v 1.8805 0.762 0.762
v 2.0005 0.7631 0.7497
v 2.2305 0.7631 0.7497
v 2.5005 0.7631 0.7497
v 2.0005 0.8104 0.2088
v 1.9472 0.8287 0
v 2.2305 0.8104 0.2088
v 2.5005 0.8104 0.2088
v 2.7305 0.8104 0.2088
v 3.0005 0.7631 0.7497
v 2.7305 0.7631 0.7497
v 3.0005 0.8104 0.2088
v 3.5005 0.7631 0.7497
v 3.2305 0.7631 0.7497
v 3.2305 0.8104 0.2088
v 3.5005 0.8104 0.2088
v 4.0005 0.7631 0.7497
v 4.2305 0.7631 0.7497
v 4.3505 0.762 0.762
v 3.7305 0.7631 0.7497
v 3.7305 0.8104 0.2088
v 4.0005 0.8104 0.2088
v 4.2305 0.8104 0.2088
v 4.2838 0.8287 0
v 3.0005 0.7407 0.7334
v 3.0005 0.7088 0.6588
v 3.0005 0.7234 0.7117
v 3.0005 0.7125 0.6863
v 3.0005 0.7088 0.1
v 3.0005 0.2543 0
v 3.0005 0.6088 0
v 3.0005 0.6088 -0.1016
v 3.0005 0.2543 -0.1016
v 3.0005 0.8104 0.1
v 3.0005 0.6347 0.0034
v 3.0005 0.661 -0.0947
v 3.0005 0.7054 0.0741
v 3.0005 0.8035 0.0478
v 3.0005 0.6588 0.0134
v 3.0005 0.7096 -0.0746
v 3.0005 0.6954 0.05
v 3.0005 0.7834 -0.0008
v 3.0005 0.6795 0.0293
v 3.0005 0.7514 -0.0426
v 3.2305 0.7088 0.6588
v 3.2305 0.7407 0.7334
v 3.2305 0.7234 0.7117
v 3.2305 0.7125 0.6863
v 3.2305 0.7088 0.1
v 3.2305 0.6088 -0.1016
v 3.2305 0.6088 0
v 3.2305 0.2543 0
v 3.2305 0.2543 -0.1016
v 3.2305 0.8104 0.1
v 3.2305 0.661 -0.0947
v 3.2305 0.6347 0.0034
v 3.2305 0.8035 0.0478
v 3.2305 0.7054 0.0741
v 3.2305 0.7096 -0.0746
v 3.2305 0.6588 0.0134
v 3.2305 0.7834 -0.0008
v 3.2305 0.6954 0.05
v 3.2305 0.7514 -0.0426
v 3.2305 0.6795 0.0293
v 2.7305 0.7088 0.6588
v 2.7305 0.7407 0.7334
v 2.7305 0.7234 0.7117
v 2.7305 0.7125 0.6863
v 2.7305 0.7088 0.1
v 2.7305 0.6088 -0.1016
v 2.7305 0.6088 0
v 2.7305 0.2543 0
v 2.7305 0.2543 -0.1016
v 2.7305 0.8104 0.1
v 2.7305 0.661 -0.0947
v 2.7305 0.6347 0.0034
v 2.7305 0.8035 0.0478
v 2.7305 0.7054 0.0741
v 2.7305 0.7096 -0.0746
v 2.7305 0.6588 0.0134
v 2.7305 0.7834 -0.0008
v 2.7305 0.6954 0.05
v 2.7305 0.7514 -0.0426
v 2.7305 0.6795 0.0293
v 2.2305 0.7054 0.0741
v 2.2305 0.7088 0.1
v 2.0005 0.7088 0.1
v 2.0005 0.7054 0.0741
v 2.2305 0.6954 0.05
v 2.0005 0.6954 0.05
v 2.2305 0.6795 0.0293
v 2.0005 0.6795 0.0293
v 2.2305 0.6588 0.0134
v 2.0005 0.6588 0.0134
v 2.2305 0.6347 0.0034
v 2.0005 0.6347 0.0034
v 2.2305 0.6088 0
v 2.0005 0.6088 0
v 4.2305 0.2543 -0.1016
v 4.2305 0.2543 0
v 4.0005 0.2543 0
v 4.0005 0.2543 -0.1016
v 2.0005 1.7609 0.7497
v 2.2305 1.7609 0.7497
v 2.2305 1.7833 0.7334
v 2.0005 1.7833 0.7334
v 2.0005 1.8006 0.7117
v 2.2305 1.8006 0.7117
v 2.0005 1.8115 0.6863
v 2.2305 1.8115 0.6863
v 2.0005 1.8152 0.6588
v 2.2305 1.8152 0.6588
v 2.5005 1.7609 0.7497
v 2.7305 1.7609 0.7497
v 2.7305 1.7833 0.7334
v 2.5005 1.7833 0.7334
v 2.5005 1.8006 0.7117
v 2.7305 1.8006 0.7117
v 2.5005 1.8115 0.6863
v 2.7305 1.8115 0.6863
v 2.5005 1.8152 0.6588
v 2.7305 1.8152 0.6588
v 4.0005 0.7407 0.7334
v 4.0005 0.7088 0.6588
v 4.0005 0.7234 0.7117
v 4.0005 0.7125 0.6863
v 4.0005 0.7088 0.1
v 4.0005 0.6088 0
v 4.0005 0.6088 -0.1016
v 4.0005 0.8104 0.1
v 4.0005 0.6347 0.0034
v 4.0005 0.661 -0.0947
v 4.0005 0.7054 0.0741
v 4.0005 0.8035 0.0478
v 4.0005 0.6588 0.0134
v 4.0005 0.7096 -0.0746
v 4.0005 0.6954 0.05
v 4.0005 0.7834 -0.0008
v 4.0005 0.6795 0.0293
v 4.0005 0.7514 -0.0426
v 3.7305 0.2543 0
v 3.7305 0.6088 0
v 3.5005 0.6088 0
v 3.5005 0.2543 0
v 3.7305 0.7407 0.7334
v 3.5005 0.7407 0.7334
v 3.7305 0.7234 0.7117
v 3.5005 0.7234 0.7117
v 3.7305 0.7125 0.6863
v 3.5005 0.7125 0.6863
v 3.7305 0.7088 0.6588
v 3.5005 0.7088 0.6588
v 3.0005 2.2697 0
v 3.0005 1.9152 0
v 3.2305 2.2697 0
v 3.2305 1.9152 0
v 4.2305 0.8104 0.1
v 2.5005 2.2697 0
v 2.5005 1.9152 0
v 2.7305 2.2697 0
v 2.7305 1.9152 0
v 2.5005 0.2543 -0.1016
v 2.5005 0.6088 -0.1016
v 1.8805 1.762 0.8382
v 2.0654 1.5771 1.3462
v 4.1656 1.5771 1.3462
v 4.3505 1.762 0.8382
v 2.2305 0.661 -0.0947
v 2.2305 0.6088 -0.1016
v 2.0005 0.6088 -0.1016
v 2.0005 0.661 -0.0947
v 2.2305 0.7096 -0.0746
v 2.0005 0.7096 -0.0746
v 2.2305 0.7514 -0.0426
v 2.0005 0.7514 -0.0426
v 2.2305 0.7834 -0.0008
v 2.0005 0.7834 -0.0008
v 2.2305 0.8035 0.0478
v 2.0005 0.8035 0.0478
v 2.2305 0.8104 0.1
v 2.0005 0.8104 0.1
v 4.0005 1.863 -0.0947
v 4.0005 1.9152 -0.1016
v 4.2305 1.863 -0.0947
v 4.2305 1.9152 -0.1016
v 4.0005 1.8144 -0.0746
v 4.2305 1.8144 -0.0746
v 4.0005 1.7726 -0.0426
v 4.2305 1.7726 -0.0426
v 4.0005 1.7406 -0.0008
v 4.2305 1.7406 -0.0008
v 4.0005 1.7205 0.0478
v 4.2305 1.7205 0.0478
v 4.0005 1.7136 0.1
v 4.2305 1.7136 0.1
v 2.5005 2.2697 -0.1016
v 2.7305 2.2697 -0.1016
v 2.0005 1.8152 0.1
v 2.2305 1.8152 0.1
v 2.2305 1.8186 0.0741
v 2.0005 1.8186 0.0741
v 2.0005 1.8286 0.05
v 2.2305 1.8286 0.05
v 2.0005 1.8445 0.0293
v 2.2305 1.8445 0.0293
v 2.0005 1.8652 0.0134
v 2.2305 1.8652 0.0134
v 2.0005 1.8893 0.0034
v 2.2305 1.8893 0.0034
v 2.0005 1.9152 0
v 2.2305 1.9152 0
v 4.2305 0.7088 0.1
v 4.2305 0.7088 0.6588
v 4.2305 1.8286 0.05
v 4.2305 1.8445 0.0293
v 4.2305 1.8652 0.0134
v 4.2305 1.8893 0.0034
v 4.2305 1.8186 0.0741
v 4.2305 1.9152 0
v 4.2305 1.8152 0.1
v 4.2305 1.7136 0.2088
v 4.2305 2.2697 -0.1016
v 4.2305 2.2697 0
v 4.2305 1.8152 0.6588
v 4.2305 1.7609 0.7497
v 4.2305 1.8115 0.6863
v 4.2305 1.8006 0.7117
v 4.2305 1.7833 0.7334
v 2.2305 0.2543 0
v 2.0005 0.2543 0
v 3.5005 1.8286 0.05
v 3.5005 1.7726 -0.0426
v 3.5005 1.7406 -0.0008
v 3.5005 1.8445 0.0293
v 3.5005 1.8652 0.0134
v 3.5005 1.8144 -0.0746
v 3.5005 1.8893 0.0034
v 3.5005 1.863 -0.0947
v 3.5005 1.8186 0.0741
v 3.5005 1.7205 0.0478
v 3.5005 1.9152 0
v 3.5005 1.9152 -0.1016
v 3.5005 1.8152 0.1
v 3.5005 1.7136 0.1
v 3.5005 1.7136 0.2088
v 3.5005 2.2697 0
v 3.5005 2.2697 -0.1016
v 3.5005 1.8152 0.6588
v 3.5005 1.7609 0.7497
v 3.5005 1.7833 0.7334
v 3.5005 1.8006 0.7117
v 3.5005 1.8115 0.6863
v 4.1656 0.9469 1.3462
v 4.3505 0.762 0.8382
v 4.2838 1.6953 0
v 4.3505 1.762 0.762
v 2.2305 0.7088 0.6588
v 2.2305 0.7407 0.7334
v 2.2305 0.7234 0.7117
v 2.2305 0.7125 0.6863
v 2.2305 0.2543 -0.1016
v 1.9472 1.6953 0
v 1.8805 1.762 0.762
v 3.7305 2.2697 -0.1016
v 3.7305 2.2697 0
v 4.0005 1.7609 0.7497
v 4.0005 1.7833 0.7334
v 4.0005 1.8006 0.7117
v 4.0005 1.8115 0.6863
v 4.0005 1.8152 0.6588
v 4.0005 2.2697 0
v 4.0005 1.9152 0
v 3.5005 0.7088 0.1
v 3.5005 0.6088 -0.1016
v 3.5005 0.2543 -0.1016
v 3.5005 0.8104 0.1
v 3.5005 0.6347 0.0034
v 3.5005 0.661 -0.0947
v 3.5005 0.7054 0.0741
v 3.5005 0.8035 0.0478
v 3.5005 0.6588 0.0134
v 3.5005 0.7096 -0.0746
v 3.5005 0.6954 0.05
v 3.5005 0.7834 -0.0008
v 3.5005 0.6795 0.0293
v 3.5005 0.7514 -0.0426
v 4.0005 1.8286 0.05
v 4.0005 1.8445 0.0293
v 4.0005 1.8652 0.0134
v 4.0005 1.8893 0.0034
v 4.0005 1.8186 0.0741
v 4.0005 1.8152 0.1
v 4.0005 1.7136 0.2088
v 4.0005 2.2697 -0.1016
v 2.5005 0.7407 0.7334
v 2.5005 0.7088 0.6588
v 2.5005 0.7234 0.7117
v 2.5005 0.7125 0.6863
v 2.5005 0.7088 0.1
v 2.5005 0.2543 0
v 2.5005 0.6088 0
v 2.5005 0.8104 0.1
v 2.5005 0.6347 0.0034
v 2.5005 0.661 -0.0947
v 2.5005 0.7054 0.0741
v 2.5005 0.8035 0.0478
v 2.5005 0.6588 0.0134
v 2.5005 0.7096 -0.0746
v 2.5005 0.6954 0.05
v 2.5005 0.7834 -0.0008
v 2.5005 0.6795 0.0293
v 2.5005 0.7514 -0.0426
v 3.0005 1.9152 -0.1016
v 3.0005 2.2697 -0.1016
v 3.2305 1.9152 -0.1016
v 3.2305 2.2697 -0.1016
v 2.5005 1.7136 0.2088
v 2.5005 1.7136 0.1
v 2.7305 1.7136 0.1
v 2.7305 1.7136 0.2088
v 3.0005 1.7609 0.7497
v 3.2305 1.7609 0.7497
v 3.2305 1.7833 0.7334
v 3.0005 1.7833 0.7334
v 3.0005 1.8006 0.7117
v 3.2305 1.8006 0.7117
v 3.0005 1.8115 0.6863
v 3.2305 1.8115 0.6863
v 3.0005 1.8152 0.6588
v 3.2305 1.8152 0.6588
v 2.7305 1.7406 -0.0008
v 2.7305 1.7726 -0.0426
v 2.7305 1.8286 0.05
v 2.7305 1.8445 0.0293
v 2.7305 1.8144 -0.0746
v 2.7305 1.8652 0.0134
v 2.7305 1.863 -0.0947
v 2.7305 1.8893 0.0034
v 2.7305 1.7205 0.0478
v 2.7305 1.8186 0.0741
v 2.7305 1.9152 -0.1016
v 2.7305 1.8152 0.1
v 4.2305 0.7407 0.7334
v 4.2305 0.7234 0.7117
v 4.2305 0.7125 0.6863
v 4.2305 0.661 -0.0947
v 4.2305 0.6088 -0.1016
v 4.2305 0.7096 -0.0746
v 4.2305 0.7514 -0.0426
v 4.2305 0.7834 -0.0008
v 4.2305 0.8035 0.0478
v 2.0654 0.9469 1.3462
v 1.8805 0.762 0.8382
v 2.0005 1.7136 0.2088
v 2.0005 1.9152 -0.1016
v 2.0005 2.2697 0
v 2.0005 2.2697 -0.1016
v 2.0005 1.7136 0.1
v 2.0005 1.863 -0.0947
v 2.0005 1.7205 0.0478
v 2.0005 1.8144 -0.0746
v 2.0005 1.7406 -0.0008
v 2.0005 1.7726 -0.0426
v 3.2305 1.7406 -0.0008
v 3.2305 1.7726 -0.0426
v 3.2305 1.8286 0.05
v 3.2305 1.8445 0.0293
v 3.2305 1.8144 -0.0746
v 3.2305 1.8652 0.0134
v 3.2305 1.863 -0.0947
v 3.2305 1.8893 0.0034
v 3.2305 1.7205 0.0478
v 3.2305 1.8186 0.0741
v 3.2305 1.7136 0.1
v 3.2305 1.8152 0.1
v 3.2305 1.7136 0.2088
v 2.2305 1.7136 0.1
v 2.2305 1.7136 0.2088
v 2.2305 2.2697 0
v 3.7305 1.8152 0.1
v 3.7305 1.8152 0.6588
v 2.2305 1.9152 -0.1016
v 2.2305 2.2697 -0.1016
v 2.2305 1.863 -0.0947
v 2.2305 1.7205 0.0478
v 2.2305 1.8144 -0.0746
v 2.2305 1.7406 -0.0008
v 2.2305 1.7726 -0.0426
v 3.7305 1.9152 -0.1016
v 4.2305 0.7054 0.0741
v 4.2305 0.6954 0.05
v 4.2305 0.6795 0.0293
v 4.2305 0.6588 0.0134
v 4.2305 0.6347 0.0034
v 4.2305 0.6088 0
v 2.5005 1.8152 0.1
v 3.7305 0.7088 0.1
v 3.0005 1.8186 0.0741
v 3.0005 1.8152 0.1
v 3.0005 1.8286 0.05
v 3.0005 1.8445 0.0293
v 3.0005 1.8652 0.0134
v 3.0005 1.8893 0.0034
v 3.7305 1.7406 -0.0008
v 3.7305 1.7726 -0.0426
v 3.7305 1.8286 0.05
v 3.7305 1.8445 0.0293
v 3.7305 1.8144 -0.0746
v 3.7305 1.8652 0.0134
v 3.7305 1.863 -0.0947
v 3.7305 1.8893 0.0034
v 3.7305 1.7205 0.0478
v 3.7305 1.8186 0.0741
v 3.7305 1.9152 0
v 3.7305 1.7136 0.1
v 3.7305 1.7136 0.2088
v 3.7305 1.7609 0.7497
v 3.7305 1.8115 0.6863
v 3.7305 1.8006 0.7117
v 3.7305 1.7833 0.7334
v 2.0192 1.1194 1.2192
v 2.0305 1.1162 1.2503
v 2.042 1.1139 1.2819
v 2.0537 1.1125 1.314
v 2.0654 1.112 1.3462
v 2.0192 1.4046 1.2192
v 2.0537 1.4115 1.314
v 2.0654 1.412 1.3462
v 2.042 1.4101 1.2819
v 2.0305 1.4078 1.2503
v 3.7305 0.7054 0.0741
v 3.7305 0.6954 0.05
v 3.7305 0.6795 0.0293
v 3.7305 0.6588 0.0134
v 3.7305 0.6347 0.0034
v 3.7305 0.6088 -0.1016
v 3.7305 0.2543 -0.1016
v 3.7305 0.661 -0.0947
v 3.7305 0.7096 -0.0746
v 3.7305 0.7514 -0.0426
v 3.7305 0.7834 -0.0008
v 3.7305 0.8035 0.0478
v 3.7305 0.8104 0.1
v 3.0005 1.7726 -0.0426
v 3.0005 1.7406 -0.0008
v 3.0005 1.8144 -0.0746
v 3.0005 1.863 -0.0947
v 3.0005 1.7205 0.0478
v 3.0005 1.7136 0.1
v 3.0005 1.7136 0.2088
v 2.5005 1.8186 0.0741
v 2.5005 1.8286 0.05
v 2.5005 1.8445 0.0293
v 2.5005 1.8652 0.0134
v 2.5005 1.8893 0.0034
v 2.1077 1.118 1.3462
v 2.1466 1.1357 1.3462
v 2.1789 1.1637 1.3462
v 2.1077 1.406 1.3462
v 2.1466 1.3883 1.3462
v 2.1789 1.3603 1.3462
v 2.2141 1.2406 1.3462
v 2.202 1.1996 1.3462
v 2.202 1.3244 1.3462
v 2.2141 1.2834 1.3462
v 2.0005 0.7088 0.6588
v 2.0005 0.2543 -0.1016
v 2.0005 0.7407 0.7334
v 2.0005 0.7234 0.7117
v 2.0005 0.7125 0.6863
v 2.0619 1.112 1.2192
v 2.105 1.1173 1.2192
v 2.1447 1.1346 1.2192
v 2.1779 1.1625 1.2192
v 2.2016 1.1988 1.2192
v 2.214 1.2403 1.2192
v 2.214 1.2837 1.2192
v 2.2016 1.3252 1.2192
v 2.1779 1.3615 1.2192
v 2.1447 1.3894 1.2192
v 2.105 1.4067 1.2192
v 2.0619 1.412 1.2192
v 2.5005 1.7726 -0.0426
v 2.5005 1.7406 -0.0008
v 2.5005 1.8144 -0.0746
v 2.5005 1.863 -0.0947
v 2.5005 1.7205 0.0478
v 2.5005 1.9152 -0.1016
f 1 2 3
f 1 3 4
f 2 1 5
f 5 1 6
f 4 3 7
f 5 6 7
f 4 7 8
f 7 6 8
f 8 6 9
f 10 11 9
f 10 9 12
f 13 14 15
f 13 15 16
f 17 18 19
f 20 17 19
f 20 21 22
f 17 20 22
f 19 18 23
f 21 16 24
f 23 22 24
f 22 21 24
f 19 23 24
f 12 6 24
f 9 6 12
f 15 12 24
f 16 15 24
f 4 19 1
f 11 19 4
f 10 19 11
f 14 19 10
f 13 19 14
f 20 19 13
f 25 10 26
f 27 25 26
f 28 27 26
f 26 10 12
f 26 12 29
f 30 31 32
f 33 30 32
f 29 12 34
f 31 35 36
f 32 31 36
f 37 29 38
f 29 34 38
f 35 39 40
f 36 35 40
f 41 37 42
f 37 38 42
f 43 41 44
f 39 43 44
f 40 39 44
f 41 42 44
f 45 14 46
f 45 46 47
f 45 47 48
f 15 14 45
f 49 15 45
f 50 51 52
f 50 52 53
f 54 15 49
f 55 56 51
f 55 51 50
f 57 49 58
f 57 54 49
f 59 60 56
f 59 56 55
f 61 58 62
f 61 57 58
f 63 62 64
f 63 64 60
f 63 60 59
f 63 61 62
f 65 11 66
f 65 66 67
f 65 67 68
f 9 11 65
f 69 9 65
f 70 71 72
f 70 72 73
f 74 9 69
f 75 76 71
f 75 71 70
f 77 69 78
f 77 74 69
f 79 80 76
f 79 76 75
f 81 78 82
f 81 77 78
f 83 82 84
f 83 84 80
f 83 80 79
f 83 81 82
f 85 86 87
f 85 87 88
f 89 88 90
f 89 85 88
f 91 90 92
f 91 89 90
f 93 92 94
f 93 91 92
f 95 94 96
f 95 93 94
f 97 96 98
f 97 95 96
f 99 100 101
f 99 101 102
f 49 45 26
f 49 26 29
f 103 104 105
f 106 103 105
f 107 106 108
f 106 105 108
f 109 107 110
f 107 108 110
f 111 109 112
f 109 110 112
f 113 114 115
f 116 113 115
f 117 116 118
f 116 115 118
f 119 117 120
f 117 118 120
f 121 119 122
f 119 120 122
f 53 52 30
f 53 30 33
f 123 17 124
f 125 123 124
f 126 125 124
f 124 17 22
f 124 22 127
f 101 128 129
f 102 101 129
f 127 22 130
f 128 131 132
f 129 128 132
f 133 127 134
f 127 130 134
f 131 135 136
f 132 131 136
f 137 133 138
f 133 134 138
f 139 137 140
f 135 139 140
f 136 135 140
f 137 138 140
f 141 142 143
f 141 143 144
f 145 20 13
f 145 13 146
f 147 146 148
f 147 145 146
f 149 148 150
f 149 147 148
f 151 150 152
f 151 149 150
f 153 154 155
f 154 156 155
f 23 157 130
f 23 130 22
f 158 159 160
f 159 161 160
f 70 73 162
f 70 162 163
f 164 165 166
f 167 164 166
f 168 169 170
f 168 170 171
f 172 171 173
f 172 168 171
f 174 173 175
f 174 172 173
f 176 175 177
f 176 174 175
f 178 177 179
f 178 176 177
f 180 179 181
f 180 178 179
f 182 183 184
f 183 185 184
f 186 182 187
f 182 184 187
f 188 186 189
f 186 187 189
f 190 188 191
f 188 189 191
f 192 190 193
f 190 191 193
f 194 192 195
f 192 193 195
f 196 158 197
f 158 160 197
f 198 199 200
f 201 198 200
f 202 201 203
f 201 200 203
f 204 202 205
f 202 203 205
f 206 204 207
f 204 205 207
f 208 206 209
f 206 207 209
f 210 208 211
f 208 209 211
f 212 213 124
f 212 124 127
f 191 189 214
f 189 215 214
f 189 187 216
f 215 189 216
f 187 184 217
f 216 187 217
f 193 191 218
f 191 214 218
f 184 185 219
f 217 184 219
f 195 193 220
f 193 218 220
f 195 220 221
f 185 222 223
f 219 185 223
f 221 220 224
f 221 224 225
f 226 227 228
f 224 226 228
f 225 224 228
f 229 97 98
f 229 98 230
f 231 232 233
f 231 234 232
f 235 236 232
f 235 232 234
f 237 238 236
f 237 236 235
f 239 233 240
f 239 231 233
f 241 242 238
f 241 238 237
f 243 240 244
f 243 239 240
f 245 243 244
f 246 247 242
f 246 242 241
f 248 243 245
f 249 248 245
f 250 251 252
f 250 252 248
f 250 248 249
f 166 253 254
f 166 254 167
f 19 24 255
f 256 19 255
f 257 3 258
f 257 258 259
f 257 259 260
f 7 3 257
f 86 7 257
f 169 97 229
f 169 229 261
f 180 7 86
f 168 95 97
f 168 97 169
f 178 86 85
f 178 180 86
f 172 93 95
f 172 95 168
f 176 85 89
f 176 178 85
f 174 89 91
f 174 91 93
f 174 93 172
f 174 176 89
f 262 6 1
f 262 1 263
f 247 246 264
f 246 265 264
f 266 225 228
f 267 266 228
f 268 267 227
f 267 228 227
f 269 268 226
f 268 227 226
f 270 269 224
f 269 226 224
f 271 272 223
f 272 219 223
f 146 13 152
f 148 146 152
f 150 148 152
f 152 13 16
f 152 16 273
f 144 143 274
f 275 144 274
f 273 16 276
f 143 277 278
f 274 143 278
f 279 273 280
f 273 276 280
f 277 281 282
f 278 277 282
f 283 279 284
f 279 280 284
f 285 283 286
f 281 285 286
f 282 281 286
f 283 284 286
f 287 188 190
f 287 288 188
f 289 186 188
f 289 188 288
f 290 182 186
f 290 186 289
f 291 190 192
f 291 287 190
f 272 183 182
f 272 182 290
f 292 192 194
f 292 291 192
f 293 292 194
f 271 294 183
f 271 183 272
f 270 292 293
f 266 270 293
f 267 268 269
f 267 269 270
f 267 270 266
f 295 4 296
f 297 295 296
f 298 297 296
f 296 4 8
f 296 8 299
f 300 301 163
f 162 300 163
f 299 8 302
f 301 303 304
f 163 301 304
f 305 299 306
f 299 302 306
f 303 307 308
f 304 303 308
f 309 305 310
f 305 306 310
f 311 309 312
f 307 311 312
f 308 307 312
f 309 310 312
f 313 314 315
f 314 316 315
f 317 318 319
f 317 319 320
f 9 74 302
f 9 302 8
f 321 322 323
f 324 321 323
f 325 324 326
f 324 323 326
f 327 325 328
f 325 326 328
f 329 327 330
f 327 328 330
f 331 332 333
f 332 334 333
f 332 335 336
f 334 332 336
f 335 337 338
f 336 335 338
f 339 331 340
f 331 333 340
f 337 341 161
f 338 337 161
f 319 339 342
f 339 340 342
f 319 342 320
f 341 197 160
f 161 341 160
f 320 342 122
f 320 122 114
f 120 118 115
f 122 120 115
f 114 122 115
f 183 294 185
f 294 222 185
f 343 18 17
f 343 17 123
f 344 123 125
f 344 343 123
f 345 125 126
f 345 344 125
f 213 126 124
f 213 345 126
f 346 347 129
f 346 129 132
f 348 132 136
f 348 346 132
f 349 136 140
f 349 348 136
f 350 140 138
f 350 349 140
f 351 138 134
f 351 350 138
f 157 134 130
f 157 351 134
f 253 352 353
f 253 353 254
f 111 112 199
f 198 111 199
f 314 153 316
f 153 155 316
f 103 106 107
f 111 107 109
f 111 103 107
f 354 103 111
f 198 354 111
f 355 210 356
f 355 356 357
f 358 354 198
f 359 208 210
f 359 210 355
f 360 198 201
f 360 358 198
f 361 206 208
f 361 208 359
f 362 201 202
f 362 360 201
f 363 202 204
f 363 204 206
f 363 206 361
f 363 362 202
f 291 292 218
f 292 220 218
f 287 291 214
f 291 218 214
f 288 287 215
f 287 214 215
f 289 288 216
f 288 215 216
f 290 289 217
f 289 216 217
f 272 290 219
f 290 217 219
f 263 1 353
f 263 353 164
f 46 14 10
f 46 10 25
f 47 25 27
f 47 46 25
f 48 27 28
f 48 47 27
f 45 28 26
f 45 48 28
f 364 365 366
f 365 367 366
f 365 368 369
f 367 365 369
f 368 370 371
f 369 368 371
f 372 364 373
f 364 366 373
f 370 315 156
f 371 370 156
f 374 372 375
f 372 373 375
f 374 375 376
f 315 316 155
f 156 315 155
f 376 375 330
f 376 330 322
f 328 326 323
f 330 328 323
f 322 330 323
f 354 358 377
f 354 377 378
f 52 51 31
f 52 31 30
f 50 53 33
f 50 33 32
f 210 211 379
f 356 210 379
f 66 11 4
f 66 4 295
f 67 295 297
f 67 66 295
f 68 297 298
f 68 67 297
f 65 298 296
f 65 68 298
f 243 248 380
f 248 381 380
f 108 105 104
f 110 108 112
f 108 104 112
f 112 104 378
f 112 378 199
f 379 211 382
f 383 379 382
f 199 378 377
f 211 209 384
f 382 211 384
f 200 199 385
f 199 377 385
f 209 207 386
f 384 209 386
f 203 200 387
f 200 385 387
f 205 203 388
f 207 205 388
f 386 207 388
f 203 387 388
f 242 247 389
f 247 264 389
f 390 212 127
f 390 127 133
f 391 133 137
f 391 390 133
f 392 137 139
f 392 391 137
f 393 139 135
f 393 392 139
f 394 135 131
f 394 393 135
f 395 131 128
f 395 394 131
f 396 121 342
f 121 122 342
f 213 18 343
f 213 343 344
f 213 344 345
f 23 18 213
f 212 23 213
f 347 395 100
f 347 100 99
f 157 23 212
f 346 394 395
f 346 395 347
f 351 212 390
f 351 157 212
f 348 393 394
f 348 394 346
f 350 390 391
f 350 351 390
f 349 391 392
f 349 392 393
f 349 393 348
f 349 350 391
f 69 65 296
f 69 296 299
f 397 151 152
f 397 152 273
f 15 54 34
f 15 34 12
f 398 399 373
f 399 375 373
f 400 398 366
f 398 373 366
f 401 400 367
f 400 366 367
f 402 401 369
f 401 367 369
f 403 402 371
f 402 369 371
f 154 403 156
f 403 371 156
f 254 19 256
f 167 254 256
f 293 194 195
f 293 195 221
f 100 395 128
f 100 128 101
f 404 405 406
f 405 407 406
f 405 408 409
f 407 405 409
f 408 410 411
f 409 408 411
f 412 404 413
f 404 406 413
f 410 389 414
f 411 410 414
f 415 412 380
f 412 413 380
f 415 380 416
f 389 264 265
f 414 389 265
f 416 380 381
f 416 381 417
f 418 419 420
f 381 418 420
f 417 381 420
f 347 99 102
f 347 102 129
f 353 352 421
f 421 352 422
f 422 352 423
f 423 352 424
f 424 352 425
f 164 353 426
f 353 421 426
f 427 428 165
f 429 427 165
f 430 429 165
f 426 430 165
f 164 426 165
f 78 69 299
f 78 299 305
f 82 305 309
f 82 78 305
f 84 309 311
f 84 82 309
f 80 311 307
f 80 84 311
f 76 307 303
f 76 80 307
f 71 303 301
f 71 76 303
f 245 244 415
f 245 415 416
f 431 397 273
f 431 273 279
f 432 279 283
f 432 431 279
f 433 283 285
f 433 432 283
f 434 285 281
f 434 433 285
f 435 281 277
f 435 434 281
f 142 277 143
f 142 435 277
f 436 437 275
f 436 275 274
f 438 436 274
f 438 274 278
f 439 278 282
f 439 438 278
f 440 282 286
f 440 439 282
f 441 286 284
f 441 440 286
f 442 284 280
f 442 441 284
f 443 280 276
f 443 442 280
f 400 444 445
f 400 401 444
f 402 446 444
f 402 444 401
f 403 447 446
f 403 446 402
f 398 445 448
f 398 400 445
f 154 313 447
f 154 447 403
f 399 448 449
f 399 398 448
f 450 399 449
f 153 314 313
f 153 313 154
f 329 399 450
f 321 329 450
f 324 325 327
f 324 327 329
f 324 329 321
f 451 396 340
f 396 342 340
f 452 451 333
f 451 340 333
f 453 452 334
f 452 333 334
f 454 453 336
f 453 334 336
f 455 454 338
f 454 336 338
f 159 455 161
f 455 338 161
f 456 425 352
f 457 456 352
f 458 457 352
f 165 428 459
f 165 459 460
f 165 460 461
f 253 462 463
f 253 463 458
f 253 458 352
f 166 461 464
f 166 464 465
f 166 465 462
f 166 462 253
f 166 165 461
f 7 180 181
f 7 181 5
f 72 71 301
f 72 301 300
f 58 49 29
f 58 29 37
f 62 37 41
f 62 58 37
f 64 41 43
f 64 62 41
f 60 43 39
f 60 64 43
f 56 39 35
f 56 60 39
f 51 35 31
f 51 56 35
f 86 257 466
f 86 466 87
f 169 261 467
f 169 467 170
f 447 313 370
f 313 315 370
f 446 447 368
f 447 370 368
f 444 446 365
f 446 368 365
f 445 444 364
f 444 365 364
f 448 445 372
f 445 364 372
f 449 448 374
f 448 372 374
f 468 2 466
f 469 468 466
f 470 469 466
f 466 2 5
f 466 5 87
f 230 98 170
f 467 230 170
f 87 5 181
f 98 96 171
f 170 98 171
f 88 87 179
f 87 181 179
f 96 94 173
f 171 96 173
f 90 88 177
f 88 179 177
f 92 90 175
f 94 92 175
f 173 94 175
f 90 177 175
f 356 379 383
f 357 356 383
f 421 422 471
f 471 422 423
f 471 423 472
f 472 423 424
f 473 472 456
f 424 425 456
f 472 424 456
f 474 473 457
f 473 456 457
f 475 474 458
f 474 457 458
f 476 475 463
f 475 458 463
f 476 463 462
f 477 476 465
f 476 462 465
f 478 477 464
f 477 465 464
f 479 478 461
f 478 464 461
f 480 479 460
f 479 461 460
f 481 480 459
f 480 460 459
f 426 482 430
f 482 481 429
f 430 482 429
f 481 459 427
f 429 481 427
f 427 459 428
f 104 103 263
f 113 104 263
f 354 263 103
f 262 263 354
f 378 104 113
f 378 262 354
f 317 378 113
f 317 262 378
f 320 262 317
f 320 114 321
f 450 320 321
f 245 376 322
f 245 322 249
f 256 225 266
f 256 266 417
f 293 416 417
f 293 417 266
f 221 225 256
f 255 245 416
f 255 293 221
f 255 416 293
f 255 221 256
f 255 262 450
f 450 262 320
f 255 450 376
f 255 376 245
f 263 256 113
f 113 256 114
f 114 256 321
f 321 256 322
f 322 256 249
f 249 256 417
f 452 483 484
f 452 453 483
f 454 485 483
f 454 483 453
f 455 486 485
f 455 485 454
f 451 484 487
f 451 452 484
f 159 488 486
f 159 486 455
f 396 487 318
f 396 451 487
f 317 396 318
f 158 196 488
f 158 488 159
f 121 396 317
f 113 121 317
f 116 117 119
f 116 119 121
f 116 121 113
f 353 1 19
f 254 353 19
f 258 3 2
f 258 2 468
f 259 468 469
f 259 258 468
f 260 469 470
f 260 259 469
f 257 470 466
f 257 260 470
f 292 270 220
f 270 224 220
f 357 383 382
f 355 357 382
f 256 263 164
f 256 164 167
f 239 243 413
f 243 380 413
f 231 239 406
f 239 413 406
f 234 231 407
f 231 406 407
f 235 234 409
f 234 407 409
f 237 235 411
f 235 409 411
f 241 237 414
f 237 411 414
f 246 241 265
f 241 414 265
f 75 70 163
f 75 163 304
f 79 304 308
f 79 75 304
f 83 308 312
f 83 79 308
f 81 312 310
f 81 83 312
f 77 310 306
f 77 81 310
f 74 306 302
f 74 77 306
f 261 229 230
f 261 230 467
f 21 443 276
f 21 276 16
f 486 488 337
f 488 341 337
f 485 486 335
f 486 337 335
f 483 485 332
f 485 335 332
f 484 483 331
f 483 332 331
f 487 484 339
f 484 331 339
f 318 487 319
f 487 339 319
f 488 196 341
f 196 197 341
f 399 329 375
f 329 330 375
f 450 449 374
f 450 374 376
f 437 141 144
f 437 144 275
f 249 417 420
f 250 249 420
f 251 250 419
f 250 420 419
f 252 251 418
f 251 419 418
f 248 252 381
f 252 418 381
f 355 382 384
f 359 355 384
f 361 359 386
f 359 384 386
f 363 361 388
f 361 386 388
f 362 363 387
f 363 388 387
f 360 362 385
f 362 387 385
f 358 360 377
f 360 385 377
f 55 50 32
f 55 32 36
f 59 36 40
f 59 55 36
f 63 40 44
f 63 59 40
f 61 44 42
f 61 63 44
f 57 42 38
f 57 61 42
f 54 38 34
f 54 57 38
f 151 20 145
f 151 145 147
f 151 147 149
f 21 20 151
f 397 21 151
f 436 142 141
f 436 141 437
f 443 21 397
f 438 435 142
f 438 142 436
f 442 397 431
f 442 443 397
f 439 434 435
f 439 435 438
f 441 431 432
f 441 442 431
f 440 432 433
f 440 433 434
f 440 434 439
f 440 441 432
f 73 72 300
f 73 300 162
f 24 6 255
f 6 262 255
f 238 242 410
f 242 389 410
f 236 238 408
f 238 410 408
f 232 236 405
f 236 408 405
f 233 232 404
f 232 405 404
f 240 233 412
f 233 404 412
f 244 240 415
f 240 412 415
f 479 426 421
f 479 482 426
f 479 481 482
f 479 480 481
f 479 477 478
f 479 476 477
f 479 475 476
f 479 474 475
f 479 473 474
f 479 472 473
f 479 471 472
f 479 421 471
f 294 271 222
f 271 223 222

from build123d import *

# Parameters (mm, degrees)
SKETCH1_W                = 2.47
SKETCH1_H                = 1
BASE_EXTRUDE_DEPTH       = 1.3462
CHAMFER1_SIZE            = 0.508
CHAMFER1_SIZE2           = 0.184896879
CHAMFER1_PART_2_SIZE     = 0.508
CHAMFER1_PART_2_SIZE2    = 0.184896879
CHAMFER1_PART_3_SIZE     = 0.508
CHAMFER1_PART_3_SIZE2    = 0.184896879
CHAMFER1_PART_4_SIZE     = 0.508
CHAMFER1_PART_4_SIZE2    = 0.184896879
CHAMFER2_SIZE            = 0.762
CHAMFER2_SIZE2           = 0.066666362
CHAMFER2_PART_2_SIZE     = 0.762
CHAMFER2_PART_2_SIZE2    = 0.066666362
CHAMFER2_PART_3_SIZE     = 0.762
CHAMFER2_PART_3_SIZE2    = 0.066666362
CHAMFER2_PART_4_SIZE     = 0.762
CHAMFER2_PART_4_SIZE2    = 0.066666362
SKETCH3_R                = 0.15
CUT_EXTRUDE1_DEPTH       = 0.127
BOSS_EXTRUDE_THIN3_DEPTH = 0.115
LPATTERN1_COUNT          = 5
LPATTERN1_PITCH          = 0.5
MIRROR1_COPY_1_DEPTH     = 0.115
MIRROR1_COPY_2_DEPTH     = 0.115
MIRROR1_COPY_3_DEPTH     = 0.115
MIRROR1_COPY_4_DEPTH     = 0.115


with BuildPart() as part:
    # Sketch1 → Base-Extrude (new body)
    with BuildSketch(Plane.XY):
        with Locations((3.115498433, 1.262)):
            Rectangle(SKETCH1_W, SKETCH1_H)
    extrude(amount=BASE_EXTRUDE_DEPTH)

    # Chamfer1
    chamfer1_edges = [part.edges().sort_by_distance(p)[0] for p in [
        (4.350498433, 1.262, 1.3462),
    ]]
    chamfer1_side = [part.faces().sort_by_distance(p)[0] for p in [
        (4.350498433, 1.262, 0.6731),
    ]]
    chamfer(chamfer1_edges, length=CHAMFER1_SIZE, length2=CHAMFER1_SIZE2, reference=chamfer1_side[0])

    # Chamfer1 part 2
    chamfer1_part_2_edges = [part.edges().sort_by_distance(p)[0] for p in [
        (3.115498433, 1.762, 1.3462),
    ]]
    chamfer1_part_2_side = [part.faces().sort_by_distance(p)[0] for p in [
        (3.115498433, 1.762, 0.6731),
    ]]
    chamfer(chamfer1_part_2_edges, length=CHAMFER1_PART_2_SIZE, length2=CHAMFER1_PART_2_SIZE2, reference=chamfer1_part_2_side[0])

    # Chamfer1 part 3
    chamfer1_part_3_edges = [part.edges().sort_by_distance(p)[0] for p in [
        (1.880498433, 1.262, 1.3462),
    ]]
    chamfer1_part_3_side = [part.faces().sort_by_distance(p)[0] for p in [
        (1.880498433, 1.262, 0.6731),
    ]]
    chamfer(chamfer1_part_3_edges, length=CHAMFER1_PART_3_SIZE, length2=CHAMFER1_PART_3_SIZE2, reference=chamfer1_part_3_side[0])

    # Chamfer1 part 4
    chamfer1_part_4_edges = [part.edges().sort_by_distance(p)[0] for p in [
        (3.115498433, 0.762, 1.3462),
    ]]
    chamfer1_part_4_side = [part.faces().sort_by_distance(p)[0] for p in [
        (3.115498433, 0.762, 0.6731),
    ]]
    chamfer(chamfer1_part_4_edges, length=CHAMFER1_PART_4_SIZE, length2=CHAMFER1_PART_4_SIZE2, reference=chamfer1_part_4_side[0])

    # Chamfer2
    chamfer2_edges = [part.edges().sort_by_distance(p)[0] for p in [
        (3.115498433, 1.762, 0),
    ]]
    chamfer2_side = [part.faces().sort_by_distance(p)[0] for p in [
        (3.115498433, 1.762, 0.4191),
    ]]
    chamfer(chamfer2_edges, length=CHAMFER2_SIZE, length2=CHAMFER2_SIZE2, reference=chamfer2_side[0])

    # Chamfer2 part 2
    chamfer2_part_2_edges = [part.edges().sort_by_distance(p)[0] for p in [
        (4.350498433, 1.262, 0),
    ]]
    chamfer2_part_2_side = [part.faces().sort_by_distance(p)[0] for p in [
        (4.350498433, 1.262, 0.4191),
    ]]
    chamfer(chamfer2_part_2_edges, length=CHAMFER2_PART_2_SIZE, length2=CHAMFER2_PART_2_SIZE2, reference=chamfer2_part_2_side[0])

    # Chamfer2 part 3
    chamfer2_part_3_edges = [part.edges().sort_by_distance(p)[0] for p in [
        (3.115498433, 0.762, 0),
    ]]
    chamfer2_part_3_side = [part.faces().sort_by_distance(p)[0] for p in [
        (3.115498433, 0.762, 0.4191),
    ]]
    chamfer(chamfer2_part_3_edges, length=CHAMFER2_PART_3_SIZE, length2=CHAMFER2_PART_3_SIZE2, reference=chamfer2_part_3_side[0])

    # Chamfer2 part 4
    chamfer2_part_4_edges = [part.edges().sort_by_distance(p)[0] for p in [
        (1.880498433, 1.262, 0),
    ]]
    chamfer2_part_4_side = [part.faces().sort_by_distance(p)[0] for p in [
        (1.880498433, 1.262, 0.4191),
    ]]
    chamfer(chamfer2_part_4_edges, length=CHAMFER2_PART_4_SIZE, length2=CHAMFER2_PART_4_SIZE2, reference=chamfer2_part_4_side[0])

    # Sketch3 → Cut-Extrude1 (cut)
    with BuildSketch(Plane(origin=(0.118935742, 0.142956615, 1.3462), x_dir=(1, 0, 0), z_dir=(0, 0, 1))):
        with Locations((1.946665812, 1.119043385)):
            Circle(SKETCH3_R)
    extrude(amount=-CUT_EXTRUDE1_DEPTH, mode=Mode.SUBTRACT)

    # Sketch4 → Boss-Extrude-Thin3 (add, symmetric)
    with BuildSketch(Plane(origin=(2.115498433, 0, 0), x_dir=(0, 0, -1), z_dir=(1, 0, 0))):
        with BuildLine():
            ThreePointArc((-0.762, 0.812000071), (-0.73177342, 0.739026651), (-0.6588, 0.708800071))
            Line((-0.6588, 0.708800071), (-0.1, 0.708800071))
            ThreePointArc((-0.1, 0.708800071), (-0.029289322, 0.679510749), (0, 0.608800071))
            Line((0, 0.608800071), (0, 0.254259822))
            Line((0, 0.254259822), (0.1016, 0.254259822))
            Line((0.1016, 0.254259822), (0.1016, 0.608800071))
            ThreePointArc((0.1016, 0.608800071), (0.042552727, 0.751352798), (-0.1, 0.810400071))
            Line((-0.1, 0.810400071), (-0.6588, 0.810400071))
            ThreePointArc((-0.6588, 0.810400071), (-0.659931371, 0.8108687), (-0.6604, 0.812000071))
            Line((-0.6604, 0.812000071), (-0.762, 0.812000071))
        make_face()
    boss_extrude_thin3 = extrude(amount=BOSS_EXTRUDE_THIN3_DEPTH, both=True)

    # LPattern1: Boss-Extrude-Thin3 ×5
    with Locations(*[(i * LPATTERN1_PITCH, 0, 0) for i in range(1, LPATTERN1_COUNT)]):
        add(boss_extrude_thin3)

    # Mirror1: Boss-Extrude-Thin3 across plane
    add(boss_extrude_thin3.mirror(Plane.ZX.offset(1.262)))

    # Mirror1 copy 1 sketch → Mirror1 copy 1 (add, symmetric)
    with BuildSketch(Plane(origin=(2.615498433, 2.524, 0), x_dir=(0, 0, -1), z_dir=(1, 0, 0))):
        with BuildLine():
            ThreePointArc((-0.762, -0.812000071), (-0.73177342, -0.739026651), (-0.6588, -0.708800071))
            Line((-0.6588, -0.708800071), (-0.1, -0.708800071))
            ThreePointArc((-0.1, -0.708800071), (-0.029289322, -0.679510749), (0, -0.608800071))
            Line((0, -0.608800071), (0, -0.254259822))
            Line((0, -0.254259822), (0.1016, -0.254259822))
            Line((0.1016, -0.254259822), (0.1016, -0.608800071))
            ThreePointArc((0.1016, -0.608800071), (0.042552727, -0.751352798), (-0.1, -0.810400071))
            Line((-0.1, -0.810400071), (-0.6588, -0.810400071))
            ThreePointArc((-0.6588, -0.810400071), (-0.659931371, -0.8108687), (-0.6604, -0.812000071))
            Line((-0.6604, -0.812000071), (-0.762, -0.812000071))
        make_face()
    extrude(amount=MIRROR1_COPY_1_DEPTH, both=True)

    # Mirror1 copy 2 sketch → Mirror1 copy 2 (add, symmetric)
    with BuildSketch(Plane(origin=(3.115498433, 2.524, 0), x_dir=(0, 0, -1), z_dir=(1, 0, 0))):
        with BuildLine():
            ThreePointArc((-0.762, -0.812000071), (-0.73177342, -0.739026651), (-0.6588, -0.708800071))
            Line((-0.6588, -0.708800071), (-0.1, -0.708800071))
            ThreePointArc((-0.1, -0.708800071), (-0.029289322, -0.679510749), (0, -0.608800071))
            Line((0, -0.608800071), (0, -0.254259822))
            Line((0, -0.254259822), (0.1016, -0.254259822))
            Line((0.1016, -0.254259822), (0.1016, -0.608800071))
            ThreePointArc((0.1016, -0.608800071), (0.042552727, -0.751352798), (-0.1, -0.810400071))
            Line((-0.1, -0.810400071), (-0.6588, -0.810400071))
            ThreePointArc((-0.6588, -0.810400071), (-0.659931371, -0.8108687), (-0.6604, -0.812000071))
            Line((-0.6604, -0.812000071), (-0.762, -0.812000071))
        make_face()
    extrude(amount=MIRROR1_COPY_2_DEPTH, both=True)

    # Mirror1 copy 3 sketch → Mirror1 copy 3 (add, symmetric)
    with BuildSketch(Plane(origin=(3.615498433, 2.524, 0), x_dir=(0, 0, -1), z_dir=(1, 0, 0))):
        with BuildLine():
            ThreePointArc((-0.762, -0.812000071), (-0.73177342, -0.739026651), (-0.6588, -0.708800071))
            Line((-0.6588, -0.708800071), (-0.1, -0.708800071))
            ThreePointArc((-0.1, -0.708800071), (-0.029289322, -0.679510749), (0, -0.608800071))
            Line((0, -0.608800071), (0, -0.254259822))
            Line((0, -0.254259822), (0.1016, -0.254259822))
            Line((0.1016, -0.254259822), (0.1016, -0.608800071))
            ThreePointArc((0.1016, -0.608800071), (0.042552727, -0.751352798), (-0.1, -0.810400071))
            Line((-0.1, -0.810400071), (-0.6588, -0.810400071))
            ThreePointArc((-0.6588, -0.810400071), (-0.659931371, -0.8108687), (-0.6604, -0.812000071))
            Line((-0.6604, -0.812000071), (-0.762, -0.812000071))
        make_face()
    extrude(amount=MIRROR1_COPY_3_DEPTH, both=True)

    # Mirror1 copy 4 sketch → Mirror1 copy 4 (add, symmetric)
    with BuildSketch(Plane(origin=(4.115498433, 2.524, 0), x_dir=(0, 0, -1), z_dir=(1, 0, 0))):
        with BuildLine():
            ThreePointArc((-0.762, -0.812000071), (-0.73177342, -0.739026651), (-0.6588, -0.708800071))
            Line((-0.6588, -0.708800071), (-0.1, -0.708800071))
            ThreePointArc((-0.1, -0.708800071), (-0.029289322, -0.679510749), (0, -0.608800071))
            Line((0, -0.608800071), (0, -0.254259822))
            Line((0, -0.254259822), (0.1016, -0.254259822))
            Line((0.1016, -0.254259822), (0.1016, -0.608800071))
            ThreePointArc((0.1016, -0.608800071), (0.042552727, -0.751352798), (-0.1, -0.810400071))
            Line((-0.1, -0.810400071), (-0.6588, -0.810400071))
            ThreePointArc((-0.6588, -0.810400071), (-0.659931371, -0.8108687), (-0.6604, -0.812000071))
            Line((-0.6604, -0.812000071), (-0.762, -0.812000071))
        make_face()
    extrude(amount=MIRROR1_COPY_4_DEPTH, both=True)


solid = part.part
